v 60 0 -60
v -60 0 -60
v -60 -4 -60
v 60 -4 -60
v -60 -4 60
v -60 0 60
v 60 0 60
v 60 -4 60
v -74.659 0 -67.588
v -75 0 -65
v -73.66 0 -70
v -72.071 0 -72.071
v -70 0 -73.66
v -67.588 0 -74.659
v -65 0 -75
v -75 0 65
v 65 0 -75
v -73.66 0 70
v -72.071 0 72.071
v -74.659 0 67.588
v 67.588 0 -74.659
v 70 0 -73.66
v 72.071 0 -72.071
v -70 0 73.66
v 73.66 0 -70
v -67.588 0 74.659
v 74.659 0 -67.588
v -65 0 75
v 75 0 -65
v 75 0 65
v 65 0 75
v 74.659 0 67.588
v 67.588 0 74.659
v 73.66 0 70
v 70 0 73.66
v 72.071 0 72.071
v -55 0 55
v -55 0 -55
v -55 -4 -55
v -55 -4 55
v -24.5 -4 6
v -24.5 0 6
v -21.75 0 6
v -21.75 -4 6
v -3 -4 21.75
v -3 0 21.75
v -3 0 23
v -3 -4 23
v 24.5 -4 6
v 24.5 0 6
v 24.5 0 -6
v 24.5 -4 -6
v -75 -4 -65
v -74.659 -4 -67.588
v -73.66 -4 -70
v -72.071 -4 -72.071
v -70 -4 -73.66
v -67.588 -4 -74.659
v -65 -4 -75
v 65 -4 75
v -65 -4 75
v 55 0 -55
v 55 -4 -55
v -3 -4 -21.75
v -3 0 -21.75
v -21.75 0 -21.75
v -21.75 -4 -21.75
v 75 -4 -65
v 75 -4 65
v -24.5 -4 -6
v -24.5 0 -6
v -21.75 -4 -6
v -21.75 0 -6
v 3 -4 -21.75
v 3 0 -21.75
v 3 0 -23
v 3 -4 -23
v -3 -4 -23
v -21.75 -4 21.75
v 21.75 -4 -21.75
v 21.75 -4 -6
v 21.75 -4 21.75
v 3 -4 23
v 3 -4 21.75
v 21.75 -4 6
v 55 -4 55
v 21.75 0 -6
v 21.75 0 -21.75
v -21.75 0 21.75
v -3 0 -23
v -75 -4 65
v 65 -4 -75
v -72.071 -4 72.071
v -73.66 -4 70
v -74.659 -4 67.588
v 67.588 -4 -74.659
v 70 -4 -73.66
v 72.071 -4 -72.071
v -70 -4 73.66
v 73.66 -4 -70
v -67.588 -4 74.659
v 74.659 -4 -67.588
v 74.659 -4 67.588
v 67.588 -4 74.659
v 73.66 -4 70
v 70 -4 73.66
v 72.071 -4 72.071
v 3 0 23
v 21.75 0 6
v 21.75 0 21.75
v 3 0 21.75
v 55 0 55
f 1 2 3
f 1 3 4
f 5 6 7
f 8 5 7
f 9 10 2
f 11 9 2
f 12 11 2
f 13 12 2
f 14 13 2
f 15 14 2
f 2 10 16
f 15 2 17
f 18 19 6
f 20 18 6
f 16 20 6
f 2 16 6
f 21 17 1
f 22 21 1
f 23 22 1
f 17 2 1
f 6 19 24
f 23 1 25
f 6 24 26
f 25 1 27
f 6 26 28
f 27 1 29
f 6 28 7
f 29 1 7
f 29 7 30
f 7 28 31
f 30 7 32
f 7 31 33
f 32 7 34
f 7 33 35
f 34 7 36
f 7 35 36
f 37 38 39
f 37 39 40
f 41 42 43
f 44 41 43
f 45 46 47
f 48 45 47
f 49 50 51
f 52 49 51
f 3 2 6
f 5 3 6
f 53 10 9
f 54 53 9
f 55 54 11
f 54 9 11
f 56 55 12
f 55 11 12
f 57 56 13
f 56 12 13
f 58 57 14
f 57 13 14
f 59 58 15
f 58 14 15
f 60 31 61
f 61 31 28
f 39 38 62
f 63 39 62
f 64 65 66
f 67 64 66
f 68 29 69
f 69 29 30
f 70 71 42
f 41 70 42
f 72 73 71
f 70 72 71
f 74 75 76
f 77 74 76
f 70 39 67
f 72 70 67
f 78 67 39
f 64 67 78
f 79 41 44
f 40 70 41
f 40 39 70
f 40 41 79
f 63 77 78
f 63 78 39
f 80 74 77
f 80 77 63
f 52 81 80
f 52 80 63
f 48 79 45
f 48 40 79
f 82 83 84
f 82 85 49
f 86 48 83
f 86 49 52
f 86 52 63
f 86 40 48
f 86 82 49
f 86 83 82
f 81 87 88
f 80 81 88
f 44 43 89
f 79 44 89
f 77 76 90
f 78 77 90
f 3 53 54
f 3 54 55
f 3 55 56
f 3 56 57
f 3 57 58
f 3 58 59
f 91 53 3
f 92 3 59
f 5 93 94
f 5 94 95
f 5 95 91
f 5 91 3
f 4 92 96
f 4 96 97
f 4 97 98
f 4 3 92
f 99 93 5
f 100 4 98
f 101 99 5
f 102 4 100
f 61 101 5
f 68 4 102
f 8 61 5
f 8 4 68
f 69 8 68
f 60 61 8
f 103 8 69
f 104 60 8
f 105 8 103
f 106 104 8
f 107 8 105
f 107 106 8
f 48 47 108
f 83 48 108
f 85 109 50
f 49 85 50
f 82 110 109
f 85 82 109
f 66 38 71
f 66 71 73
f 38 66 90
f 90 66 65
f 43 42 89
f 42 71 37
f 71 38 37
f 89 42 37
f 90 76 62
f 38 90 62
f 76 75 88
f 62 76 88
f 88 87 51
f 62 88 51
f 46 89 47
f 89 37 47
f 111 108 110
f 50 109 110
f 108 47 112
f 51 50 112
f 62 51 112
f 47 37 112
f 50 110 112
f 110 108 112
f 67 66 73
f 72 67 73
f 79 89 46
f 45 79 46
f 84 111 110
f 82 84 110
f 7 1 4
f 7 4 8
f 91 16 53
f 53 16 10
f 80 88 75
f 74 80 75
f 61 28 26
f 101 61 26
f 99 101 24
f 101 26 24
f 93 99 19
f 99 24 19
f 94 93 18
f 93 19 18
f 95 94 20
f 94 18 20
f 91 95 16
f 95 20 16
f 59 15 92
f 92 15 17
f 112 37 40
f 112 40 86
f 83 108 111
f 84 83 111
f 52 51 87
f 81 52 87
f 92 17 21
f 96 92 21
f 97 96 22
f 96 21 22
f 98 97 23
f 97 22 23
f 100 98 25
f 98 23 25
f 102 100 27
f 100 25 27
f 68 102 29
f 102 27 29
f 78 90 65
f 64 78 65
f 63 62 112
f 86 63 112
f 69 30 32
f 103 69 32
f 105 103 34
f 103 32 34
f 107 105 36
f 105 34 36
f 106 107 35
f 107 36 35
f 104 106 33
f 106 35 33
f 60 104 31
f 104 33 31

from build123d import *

# Parameters (mm, degrees)
F0_W     = 120
F0_H     = 120
F0_W_2   = 110
F0_H_2   = 110
F1_DEPTH = 4


with BuildPart() as f1:
    # F0 (on Front) → F1 (new body)
    with BuildSketch(Plane.XZ):
        with BuildLine():
            Line((-65, -75), (65, -75))
            ThreePointArc((65, -75), (72.071068, -72.071068), (75, -65))
            Line((75, -65), (75, 65))
            ThreePointArc((75, 65), (72.071068, 72.071068), (65, 75))
            Line((65, 75), (-65, 75))
            ThreePointArc((-65, 75), (-72.071068, 72.071068), (-75, 65))
            Line((-75, 65), (-75, -65))
            ThreePointArc((-75, -65), (-72.071068, -72.071068), (-65, -75))
        make_face()
        Rectangle(F0_W, F0_H, mode=Mode.SUBTRACT)
        Rectangle(F0_W_2, F0_H_2)
        Polygon((21.75, -6), (21.75, -21.75), (3, -21.75), (3, -23), (-3, -23), (-3, -21.75), (-21.75, -21.75), (-21.75, -6), (-24.5, -6), (-24.5, 6), (-21.75, 6), (-21.75, 21.75), (-3, 21.75), (-3, 23), (3, 23), (3, 21.75), (21.75, 21.75), (21.75, 6), (24.5, 6), (24.5, -6), align=None, mode=Mode.SUBTRACT)
    extrude(amount=F1_DEPTH)


solid = f1.part
